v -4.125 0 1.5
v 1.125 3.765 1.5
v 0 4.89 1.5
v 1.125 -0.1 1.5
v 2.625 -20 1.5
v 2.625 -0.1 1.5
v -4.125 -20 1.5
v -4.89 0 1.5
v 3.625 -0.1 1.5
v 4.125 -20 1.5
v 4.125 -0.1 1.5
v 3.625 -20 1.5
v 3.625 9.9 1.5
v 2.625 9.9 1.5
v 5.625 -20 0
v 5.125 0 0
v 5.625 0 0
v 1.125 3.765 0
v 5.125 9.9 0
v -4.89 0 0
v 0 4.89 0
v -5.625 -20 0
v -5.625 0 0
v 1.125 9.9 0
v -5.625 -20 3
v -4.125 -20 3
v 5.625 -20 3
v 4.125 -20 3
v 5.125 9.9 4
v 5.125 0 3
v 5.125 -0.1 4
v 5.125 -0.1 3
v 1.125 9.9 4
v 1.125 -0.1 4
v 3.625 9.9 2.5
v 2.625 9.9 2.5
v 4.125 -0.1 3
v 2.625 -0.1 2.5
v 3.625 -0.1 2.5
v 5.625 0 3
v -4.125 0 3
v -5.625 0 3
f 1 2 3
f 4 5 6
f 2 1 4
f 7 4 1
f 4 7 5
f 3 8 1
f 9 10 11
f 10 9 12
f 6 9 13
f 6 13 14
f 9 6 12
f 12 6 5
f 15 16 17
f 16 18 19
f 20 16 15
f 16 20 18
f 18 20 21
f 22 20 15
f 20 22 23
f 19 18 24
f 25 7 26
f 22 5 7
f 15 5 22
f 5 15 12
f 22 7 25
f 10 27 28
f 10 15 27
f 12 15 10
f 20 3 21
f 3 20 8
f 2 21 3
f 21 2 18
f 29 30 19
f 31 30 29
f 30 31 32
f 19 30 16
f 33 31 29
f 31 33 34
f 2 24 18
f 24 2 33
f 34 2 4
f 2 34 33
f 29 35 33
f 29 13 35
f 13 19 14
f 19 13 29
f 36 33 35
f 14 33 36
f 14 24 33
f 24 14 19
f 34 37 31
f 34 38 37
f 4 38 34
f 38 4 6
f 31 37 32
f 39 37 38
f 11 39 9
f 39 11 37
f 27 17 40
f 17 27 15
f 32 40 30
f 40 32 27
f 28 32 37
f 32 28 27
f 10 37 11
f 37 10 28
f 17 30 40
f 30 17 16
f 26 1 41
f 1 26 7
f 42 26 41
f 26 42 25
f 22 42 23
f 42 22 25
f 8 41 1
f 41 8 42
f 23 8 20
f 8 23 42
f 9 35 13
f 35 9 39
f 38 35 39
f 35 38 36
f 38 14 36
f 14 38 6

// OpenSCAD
$fn=8;




ts=1.5; // толщина стенки
tp=1;//диаметр жилы
tpr=1.7;//диаметр провода
dd=0.4;
pin=[0.65+dd,0.65+dd,11.5];
lin=[10,60,3];//ширина, длина, толщина
hs=5+ts;
step=4.75+2*tp;
lnog=20;
tub=tp+ts*2;
sdv=(step+2*ts)/2-ts/2-tp;

    difference(){
        union(){
            translate([0,-lnog/2,ts/2]) cube([step+2*ts,lnog/1,ts],true);
            translate([0,0,ts/2]) rotate([0,0,45])cube([(step+2*ts)/1.41,(step+2*ts)/1.41,ts],true);
            translate([sdv,lnog/4-0.1,tub/2]) cube([tub,lnog/2,tub],true);
            translate([(step+2*ts)/2,-lnog/2,ts]) cube([ts,lnog/1,ts*2],true);
            translate([-(step+2*ts)/2,-lnog/2,ts]) cube([ts,lnog/1,ts*2],true);
        }
        translate([sdv,0,ts+tp/2]) cube([tp,lnog*3,tp],true);
    }

//all();
module all(){
    difference(){
        union(){
            translate([0,lin.y/2,(ts+lin.z)/2]) cube([lin.x+2*ts,lin.y,lin.z+ts],true);
            translate([0,0,hs/2]) cube([lin.x+2*ts,pin.y*6,hs],true);
        }
        translate([0,lin.y,(ts+lin.z)/2+ts/2]) cube([lin.x,lin.y*2,lin.z+ts],true);
        translate([step/2,pin.y*3,pin.z+ts]) cube([pin.x,pin.y*6,pin.z*2],true);
        translate([-step/2,pin.y*3,pin.z+ts]) cube([pin.x,pin.y*6,pin.z*2],true);
    }
}
